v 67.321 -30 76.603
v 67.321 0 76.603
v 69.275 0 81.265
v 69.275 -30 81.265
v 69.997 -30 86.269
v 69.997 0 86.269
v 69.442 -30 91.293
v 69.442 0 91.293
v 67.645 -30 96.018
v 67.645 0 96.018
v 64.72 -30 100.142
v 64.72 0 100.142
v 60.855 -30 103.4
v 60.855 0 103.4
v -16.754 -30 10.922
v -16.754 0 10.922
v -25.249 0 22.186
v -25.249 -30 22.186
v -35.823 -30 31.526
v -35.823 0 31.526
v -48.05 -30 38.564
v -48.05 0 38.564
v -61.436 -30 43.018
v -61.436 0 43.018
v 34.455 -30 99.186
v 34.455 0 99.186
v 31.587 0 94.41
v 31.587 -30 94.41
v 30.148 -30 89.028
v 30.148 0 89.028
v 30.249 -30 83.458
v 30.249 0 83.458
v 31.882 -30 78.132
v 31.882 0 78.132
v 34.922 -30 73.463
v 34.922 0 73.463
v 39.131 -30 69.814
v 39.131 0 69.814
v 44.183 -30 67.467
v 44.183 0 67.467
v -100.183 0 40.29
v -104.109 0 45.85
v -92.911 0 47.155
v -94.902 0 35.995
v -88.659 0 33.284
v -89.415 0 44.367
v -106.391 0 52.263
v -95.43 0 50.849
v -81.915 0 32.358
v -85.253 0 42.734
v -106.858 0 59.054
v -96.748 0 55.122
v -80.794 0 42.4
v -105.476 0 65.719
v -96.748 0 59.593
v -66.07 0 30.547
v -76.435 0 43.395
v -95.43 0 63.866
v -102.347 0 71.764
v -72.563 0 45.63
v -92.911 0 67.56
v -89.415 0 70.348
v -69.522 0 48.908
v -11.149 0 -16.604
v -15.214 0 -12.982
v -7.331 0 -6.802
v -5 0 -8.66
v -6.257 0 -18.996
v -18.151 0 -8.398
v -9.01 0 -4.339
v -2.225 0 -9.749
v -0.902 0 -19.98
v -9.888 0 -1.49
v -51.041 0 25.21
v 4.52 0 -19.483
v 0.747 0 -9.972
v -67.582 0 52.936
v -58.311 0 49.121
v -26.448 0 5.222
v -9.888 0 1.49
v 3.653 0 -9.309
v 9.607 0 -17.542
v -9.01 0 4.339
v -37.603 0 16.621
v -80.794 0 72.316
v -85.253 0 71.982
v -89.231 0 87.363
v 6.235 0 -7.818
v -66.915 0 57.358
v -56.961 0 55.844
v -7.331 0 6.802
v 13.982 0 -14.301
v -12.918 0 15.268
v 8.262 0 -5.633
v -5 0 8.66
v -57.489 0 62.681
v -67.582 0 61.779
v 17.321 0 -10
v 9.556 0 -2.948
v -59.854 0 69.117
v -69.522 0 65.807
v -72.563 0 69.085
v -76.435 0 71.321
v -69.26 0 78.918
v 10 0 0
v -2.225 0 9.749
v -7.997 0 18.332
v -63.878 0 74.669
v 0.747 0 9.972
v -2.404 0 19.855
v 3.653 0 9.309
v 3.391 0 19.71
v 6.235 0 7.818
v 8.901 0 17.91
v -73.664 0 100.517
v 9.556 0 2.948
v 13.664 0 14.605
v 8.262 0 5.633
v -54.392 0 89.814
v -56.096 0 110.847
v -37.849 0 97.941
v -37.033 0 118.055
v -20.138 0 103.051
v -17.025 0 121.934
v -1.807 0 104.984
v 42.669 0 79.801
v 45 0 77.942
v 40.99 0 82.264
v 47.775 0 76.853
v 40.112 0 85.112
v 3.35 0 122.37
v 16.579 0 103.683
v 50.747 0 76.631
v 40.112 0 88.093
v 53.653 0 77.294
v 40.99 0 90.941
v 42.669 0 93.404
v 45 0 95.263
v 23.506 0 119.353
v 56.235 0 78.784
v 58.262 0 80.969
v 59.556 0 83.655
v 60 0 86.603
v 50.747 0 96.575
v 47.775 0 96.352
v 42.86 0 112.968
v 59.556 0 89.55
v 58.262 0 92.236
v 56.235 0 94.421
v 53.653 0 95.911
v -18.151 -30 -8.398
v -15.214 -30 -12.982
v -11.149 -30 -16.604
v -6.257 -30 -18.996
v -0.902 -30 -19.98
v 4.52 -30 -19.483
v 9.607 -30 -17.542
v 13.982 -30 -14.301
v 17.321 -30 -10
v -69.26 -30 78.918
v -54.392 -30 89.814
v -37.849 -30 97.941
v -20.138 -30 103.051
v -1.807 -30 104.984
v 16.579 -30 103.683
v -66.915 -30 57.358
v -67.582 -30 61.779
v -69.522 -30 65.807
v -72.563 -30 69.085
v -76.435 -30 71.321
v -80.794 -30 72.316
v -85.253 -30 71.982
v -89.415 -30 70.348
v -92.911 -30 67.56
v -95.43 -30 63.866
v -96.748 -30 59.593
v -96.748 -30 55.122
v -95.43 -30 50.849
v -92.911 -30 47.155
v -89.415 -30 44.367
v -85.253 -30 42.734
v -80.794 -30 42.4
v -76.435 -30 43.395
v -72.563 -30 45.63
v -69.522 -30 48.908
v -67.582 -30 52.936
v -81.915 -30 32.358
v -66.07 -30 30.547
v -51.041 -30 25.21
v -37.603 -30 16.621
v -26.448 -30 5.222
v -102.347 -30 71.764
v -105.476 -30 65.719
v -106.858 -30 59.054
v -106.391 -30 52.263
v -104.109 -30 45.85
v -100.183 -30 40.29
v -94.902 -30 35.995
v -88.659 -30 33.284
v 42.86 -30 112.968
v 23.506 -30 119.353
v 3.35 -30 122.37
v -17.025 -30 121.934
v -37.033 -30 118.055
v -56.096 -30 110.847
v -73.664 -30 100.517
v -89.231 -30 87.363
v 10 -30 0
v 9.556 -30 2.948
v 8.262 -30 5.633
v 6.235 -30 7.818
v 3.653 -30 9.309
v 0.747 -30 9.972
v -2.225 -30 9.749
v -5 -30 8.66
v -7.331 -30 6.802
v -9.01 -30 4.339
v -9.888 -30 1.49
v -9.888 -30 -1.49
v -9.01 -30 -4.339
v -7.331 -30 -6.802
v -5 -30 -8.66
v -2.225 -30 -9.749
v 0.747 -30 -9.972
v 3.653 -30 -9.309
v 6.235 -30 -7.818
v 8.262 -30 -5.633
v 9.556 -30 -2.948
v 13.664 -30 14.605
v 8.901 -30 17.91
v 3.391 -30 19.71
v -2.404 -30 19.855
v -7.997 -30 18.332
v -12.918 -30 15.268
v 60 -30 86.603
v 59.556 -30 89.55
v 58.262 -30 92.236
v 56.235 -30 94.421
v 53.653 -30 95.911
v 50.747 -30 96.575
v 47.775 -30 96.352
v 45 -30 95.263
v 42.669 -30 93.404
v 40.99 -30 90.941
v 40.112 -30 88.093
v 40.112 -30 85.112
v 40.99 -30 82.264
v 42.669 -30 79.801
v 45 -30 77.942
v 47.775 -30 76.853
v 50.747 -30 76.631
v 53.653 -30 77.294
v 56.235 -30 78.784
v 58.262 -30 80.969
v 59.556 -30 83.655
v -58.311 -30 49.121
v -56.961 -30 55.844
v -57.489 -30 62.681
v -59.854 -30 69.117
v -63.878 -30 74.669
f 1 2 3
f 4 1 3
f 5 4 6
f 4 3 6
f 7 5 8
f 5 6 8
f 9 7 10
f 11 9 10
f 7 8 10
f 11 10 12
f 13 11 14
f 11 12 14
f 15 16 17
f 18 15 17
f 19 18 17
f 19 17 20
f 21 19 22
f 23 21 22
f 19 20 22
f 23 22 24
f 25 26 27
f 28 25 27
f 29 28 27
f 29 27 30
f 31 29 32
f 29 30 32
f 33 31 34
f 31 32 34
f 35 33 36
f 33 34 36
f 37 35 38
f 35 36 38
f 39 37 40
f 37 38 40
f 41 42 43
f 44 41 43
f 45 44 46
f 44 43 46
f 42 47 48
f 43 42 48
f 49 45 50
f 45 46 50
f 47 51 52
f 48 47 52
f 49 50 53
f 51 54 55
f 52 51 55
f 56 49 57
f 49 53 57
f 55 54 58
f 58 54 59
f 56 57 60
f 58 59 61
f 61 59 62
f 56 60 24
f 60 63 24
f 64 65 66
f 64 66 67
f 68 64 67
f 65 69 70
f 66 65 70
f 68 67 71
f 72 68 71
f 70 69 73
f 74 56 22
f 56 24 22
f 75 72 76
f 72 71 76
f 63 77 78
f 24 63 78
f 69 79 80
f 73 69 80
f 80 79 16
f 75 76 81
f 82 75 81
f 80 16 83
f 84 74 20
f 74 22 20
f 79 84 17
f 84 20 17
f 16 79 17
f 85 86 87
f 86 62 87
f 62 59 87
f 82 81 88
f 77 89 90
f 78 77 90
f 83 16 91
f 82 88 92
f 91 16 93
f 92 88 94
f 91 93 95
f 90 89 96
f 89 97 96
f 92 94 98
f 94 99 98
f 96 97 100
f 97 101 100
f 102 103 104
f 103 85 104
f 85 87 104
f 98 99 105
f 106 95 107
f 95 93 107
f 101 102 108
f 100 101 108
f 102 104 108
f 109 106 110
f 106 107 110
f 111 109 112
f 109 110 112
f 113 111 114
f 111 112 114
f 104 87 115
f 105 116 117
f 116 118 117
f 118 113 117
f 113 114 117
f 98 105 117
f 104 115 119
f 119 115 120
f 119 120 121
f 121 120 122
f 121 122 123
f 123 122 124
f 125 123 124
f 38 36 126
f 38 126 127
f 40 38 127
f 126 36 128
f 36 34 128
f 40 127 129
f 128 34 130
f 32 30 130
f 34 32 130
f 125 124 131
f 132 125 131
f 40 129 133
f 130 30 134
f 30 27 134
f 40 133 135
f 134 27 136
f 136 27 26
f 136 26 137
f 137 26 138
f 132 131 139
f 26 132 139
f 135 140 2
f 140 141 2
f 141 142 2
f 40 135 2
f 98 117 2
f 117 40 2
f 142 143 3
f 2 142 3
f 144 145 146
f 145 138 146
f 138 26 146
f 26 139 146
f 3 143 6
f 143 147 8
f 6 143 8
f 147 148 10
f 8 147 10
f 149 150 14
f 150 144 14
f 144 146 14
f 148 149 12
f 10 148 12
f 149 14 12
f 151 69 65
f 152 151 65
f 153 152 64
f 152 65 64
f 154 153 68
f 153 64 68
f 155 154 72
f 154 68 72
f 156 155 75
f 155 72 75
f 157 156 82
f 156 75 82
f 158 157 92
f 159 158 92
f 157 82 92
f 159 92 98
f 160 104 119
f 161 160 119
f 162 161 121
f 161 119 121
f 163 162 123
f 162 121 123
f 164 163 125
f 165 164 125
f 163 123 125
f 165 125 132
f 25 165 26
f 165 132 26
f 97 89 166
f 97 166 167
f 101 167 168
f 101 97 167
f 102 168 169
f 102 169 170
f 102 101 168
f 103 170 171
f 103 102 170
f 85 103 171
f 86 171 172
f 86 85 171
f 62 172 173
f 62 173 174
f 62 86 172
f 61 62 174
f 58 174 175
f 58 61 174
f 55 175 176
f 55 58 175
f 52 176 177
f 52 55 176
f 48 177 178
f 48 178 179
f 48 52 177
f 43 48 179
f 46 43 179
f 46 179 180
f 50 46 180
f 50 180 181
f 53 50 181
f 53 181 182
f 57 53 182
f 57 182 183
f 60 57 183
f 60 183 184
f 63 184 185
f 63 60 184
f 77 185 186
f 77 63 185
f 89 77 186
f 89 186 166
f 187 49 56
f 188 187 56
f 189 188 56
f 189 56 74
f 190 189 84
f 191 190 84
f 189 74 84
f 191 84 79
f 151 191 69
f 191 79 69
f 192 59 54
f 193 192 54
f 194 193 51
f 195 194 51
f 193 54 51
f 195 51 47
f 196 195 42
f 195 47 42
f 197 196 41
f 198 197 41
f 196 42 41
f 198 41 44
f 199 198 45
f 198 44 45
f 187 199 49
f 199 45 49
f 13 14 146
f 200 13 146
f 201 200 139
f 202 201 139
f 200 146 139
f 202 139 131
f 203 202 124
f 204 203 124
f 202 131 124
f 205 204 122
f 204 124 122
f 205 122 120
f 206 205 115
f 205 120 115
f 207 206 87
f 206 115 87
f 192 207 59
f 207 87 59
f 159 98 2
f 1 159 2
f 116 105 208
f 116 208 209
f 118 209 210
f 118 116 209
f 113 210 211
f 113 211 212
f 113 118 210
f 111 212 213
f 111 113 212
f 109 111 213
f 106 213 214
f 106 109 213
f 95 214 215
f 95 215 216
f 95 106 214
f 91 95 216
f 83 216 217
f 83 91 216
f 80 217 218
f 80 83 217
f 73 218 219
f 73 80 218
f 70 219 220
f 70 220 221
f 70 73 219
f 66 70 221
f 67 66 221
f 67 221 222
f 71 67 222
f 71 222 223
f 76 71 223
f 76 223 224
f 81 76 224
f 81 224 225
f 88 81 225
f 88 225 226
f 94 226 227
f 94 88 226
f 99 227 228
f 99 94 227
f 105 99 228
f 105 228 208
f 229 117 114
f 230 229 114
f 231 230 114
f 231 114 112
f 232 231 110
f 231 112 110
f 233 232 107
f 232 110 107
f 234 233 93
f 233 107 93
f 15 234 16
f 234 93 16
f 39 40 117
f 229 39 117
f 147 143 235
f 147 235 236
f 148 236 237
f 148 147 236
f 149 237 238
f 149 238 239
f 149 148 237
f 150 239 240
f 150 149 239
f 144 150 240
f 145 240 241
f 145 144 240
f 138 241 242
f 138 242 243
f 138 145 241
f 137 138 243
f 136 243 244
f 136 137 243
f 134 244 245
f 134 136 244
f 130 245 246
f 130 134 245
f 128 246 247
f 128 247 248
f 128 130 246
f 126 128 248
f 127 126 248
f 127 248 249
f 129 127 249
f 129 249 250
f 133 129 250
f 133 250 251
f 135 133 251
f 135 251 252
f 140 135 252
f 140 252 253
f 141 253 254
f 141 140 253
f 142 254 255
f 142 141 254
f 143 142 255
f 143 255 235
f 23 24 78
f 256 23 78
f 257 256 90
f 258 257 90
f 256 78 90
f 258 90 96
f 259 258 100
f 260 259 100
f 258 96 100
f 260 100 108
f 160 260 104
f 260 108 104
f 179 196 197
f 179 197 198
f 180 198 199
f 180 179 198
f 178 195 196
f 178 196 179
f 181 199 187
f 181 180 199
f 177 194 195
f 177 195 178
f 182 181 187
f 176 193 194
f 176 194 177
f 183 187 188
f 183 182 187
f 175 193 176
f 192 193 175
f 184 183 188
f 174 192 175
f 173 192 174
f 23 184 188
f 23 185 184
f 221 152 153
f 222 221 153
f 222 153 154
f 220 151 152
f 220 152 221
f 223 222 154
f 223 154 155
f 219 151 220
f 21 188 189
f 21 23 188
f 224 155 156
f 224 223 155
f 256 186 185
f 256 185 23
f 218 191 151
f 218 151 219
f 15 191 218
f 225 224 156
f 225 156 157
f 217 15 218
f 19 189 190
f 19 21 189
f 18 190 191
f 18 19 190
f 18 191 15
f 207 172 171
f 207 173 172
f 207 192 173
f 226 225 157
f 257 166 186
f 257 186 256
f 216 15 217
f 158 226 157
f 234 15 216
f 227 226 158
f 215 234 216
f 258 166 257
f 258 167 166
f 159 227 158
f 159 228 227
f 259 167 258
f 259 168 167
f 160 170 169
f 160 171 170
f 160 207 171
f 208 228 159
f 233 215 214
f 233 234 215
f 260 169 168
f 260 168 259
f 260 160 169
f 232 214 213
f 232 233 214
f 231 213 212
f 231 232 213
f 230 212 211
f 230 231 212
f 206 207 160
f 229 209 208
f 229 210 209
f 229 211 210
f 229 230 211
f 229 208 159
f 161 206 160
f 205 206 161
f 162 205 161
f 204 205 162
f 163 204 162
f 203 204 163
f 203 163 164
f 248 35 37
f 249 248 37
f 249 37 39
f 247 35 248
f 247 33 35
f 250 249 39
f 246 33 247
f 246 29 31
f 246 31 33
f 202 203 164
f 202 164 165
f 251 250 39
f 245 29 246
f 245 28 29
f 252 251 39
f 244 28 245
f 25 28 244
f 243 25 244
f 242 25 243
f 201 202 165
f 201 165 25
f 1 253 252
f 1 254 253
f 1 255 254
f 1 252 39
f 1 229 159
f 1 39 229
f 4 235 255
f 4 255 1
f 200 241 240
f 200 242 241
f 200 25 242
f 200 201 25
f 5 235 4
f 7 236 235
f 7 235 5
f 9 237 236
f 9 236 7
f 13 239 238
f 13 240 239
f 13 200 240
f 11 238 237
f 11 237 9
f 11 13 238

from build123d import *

# Parameters (mm, degrees)
F0_R     = 10
F0_R_2   = 15
F1_DEPTH = 30


with BuildPart() as f1:
    # F0 (on Front) → F1 (new body)
    with BuildSketch(Plane.XZ):
        with BuildLine():
            ThreePointArc((-81.915204, 32.357644), (-44.077123, 21.298231), (-18.151285, -8.398265))
            ThreePointArc((-18.151285, -8.398265), (-0.902184, -19.979641), (17.320508, -10))
            Line((17.320508, -10), (67.320508, 76.60254))
            ThreePointArc((67.320508, 76.60254), (69.442127, 91.293348), (60.854969, 103.400446))
            ThreePointArc((60.854969, 103.400446), (-27.111474, 120.420007), (-102.346878, 71.764126))
            ThreePointArc((-102.346878, 71.764126), (-104.109371, 45.850299), (-81.915204, 32.357644))
        make_face()
        Circle(F0_R, mode=Mode.SUBTRACT)
        with Locations((-81.915204, 57.357644)):
            Circle(F0_R_2, mode=Mode.SUBTRACT)
        with BuildLine():
            ThreePointArc((-69.260057, 78.91796), (-20.13831, 103.050708), (34.45473, 99.186045))
            ThreePointArc((34.45473, 99.186045), (30.879167, 80.737922), (44.183374, 67.467053))
            Line((44.183374, 67.467053), (13.663505, 14.605089))
            ThreePointArc((13.663505, 14.605089), (-2.403826, 19.855015), (-16.754099, 10.922461))
            ThreePointArc((-16.754099, 10.922461), (-35.823115, 31.52567), (-61.436403, 43.018233))
            ThreePointArc((-61.436403, 43.018233), (-57.488534, 62.680966), (-69.260057, 78.91796))
        make_face(mode=Mode.SUBTRACT)
        with Locations((50, 86.60254)):
            Circle(F0_R, mode=Mode.SUBTRACT)
    extrude(amount=F1_DEPTH)


solid = f1.part
